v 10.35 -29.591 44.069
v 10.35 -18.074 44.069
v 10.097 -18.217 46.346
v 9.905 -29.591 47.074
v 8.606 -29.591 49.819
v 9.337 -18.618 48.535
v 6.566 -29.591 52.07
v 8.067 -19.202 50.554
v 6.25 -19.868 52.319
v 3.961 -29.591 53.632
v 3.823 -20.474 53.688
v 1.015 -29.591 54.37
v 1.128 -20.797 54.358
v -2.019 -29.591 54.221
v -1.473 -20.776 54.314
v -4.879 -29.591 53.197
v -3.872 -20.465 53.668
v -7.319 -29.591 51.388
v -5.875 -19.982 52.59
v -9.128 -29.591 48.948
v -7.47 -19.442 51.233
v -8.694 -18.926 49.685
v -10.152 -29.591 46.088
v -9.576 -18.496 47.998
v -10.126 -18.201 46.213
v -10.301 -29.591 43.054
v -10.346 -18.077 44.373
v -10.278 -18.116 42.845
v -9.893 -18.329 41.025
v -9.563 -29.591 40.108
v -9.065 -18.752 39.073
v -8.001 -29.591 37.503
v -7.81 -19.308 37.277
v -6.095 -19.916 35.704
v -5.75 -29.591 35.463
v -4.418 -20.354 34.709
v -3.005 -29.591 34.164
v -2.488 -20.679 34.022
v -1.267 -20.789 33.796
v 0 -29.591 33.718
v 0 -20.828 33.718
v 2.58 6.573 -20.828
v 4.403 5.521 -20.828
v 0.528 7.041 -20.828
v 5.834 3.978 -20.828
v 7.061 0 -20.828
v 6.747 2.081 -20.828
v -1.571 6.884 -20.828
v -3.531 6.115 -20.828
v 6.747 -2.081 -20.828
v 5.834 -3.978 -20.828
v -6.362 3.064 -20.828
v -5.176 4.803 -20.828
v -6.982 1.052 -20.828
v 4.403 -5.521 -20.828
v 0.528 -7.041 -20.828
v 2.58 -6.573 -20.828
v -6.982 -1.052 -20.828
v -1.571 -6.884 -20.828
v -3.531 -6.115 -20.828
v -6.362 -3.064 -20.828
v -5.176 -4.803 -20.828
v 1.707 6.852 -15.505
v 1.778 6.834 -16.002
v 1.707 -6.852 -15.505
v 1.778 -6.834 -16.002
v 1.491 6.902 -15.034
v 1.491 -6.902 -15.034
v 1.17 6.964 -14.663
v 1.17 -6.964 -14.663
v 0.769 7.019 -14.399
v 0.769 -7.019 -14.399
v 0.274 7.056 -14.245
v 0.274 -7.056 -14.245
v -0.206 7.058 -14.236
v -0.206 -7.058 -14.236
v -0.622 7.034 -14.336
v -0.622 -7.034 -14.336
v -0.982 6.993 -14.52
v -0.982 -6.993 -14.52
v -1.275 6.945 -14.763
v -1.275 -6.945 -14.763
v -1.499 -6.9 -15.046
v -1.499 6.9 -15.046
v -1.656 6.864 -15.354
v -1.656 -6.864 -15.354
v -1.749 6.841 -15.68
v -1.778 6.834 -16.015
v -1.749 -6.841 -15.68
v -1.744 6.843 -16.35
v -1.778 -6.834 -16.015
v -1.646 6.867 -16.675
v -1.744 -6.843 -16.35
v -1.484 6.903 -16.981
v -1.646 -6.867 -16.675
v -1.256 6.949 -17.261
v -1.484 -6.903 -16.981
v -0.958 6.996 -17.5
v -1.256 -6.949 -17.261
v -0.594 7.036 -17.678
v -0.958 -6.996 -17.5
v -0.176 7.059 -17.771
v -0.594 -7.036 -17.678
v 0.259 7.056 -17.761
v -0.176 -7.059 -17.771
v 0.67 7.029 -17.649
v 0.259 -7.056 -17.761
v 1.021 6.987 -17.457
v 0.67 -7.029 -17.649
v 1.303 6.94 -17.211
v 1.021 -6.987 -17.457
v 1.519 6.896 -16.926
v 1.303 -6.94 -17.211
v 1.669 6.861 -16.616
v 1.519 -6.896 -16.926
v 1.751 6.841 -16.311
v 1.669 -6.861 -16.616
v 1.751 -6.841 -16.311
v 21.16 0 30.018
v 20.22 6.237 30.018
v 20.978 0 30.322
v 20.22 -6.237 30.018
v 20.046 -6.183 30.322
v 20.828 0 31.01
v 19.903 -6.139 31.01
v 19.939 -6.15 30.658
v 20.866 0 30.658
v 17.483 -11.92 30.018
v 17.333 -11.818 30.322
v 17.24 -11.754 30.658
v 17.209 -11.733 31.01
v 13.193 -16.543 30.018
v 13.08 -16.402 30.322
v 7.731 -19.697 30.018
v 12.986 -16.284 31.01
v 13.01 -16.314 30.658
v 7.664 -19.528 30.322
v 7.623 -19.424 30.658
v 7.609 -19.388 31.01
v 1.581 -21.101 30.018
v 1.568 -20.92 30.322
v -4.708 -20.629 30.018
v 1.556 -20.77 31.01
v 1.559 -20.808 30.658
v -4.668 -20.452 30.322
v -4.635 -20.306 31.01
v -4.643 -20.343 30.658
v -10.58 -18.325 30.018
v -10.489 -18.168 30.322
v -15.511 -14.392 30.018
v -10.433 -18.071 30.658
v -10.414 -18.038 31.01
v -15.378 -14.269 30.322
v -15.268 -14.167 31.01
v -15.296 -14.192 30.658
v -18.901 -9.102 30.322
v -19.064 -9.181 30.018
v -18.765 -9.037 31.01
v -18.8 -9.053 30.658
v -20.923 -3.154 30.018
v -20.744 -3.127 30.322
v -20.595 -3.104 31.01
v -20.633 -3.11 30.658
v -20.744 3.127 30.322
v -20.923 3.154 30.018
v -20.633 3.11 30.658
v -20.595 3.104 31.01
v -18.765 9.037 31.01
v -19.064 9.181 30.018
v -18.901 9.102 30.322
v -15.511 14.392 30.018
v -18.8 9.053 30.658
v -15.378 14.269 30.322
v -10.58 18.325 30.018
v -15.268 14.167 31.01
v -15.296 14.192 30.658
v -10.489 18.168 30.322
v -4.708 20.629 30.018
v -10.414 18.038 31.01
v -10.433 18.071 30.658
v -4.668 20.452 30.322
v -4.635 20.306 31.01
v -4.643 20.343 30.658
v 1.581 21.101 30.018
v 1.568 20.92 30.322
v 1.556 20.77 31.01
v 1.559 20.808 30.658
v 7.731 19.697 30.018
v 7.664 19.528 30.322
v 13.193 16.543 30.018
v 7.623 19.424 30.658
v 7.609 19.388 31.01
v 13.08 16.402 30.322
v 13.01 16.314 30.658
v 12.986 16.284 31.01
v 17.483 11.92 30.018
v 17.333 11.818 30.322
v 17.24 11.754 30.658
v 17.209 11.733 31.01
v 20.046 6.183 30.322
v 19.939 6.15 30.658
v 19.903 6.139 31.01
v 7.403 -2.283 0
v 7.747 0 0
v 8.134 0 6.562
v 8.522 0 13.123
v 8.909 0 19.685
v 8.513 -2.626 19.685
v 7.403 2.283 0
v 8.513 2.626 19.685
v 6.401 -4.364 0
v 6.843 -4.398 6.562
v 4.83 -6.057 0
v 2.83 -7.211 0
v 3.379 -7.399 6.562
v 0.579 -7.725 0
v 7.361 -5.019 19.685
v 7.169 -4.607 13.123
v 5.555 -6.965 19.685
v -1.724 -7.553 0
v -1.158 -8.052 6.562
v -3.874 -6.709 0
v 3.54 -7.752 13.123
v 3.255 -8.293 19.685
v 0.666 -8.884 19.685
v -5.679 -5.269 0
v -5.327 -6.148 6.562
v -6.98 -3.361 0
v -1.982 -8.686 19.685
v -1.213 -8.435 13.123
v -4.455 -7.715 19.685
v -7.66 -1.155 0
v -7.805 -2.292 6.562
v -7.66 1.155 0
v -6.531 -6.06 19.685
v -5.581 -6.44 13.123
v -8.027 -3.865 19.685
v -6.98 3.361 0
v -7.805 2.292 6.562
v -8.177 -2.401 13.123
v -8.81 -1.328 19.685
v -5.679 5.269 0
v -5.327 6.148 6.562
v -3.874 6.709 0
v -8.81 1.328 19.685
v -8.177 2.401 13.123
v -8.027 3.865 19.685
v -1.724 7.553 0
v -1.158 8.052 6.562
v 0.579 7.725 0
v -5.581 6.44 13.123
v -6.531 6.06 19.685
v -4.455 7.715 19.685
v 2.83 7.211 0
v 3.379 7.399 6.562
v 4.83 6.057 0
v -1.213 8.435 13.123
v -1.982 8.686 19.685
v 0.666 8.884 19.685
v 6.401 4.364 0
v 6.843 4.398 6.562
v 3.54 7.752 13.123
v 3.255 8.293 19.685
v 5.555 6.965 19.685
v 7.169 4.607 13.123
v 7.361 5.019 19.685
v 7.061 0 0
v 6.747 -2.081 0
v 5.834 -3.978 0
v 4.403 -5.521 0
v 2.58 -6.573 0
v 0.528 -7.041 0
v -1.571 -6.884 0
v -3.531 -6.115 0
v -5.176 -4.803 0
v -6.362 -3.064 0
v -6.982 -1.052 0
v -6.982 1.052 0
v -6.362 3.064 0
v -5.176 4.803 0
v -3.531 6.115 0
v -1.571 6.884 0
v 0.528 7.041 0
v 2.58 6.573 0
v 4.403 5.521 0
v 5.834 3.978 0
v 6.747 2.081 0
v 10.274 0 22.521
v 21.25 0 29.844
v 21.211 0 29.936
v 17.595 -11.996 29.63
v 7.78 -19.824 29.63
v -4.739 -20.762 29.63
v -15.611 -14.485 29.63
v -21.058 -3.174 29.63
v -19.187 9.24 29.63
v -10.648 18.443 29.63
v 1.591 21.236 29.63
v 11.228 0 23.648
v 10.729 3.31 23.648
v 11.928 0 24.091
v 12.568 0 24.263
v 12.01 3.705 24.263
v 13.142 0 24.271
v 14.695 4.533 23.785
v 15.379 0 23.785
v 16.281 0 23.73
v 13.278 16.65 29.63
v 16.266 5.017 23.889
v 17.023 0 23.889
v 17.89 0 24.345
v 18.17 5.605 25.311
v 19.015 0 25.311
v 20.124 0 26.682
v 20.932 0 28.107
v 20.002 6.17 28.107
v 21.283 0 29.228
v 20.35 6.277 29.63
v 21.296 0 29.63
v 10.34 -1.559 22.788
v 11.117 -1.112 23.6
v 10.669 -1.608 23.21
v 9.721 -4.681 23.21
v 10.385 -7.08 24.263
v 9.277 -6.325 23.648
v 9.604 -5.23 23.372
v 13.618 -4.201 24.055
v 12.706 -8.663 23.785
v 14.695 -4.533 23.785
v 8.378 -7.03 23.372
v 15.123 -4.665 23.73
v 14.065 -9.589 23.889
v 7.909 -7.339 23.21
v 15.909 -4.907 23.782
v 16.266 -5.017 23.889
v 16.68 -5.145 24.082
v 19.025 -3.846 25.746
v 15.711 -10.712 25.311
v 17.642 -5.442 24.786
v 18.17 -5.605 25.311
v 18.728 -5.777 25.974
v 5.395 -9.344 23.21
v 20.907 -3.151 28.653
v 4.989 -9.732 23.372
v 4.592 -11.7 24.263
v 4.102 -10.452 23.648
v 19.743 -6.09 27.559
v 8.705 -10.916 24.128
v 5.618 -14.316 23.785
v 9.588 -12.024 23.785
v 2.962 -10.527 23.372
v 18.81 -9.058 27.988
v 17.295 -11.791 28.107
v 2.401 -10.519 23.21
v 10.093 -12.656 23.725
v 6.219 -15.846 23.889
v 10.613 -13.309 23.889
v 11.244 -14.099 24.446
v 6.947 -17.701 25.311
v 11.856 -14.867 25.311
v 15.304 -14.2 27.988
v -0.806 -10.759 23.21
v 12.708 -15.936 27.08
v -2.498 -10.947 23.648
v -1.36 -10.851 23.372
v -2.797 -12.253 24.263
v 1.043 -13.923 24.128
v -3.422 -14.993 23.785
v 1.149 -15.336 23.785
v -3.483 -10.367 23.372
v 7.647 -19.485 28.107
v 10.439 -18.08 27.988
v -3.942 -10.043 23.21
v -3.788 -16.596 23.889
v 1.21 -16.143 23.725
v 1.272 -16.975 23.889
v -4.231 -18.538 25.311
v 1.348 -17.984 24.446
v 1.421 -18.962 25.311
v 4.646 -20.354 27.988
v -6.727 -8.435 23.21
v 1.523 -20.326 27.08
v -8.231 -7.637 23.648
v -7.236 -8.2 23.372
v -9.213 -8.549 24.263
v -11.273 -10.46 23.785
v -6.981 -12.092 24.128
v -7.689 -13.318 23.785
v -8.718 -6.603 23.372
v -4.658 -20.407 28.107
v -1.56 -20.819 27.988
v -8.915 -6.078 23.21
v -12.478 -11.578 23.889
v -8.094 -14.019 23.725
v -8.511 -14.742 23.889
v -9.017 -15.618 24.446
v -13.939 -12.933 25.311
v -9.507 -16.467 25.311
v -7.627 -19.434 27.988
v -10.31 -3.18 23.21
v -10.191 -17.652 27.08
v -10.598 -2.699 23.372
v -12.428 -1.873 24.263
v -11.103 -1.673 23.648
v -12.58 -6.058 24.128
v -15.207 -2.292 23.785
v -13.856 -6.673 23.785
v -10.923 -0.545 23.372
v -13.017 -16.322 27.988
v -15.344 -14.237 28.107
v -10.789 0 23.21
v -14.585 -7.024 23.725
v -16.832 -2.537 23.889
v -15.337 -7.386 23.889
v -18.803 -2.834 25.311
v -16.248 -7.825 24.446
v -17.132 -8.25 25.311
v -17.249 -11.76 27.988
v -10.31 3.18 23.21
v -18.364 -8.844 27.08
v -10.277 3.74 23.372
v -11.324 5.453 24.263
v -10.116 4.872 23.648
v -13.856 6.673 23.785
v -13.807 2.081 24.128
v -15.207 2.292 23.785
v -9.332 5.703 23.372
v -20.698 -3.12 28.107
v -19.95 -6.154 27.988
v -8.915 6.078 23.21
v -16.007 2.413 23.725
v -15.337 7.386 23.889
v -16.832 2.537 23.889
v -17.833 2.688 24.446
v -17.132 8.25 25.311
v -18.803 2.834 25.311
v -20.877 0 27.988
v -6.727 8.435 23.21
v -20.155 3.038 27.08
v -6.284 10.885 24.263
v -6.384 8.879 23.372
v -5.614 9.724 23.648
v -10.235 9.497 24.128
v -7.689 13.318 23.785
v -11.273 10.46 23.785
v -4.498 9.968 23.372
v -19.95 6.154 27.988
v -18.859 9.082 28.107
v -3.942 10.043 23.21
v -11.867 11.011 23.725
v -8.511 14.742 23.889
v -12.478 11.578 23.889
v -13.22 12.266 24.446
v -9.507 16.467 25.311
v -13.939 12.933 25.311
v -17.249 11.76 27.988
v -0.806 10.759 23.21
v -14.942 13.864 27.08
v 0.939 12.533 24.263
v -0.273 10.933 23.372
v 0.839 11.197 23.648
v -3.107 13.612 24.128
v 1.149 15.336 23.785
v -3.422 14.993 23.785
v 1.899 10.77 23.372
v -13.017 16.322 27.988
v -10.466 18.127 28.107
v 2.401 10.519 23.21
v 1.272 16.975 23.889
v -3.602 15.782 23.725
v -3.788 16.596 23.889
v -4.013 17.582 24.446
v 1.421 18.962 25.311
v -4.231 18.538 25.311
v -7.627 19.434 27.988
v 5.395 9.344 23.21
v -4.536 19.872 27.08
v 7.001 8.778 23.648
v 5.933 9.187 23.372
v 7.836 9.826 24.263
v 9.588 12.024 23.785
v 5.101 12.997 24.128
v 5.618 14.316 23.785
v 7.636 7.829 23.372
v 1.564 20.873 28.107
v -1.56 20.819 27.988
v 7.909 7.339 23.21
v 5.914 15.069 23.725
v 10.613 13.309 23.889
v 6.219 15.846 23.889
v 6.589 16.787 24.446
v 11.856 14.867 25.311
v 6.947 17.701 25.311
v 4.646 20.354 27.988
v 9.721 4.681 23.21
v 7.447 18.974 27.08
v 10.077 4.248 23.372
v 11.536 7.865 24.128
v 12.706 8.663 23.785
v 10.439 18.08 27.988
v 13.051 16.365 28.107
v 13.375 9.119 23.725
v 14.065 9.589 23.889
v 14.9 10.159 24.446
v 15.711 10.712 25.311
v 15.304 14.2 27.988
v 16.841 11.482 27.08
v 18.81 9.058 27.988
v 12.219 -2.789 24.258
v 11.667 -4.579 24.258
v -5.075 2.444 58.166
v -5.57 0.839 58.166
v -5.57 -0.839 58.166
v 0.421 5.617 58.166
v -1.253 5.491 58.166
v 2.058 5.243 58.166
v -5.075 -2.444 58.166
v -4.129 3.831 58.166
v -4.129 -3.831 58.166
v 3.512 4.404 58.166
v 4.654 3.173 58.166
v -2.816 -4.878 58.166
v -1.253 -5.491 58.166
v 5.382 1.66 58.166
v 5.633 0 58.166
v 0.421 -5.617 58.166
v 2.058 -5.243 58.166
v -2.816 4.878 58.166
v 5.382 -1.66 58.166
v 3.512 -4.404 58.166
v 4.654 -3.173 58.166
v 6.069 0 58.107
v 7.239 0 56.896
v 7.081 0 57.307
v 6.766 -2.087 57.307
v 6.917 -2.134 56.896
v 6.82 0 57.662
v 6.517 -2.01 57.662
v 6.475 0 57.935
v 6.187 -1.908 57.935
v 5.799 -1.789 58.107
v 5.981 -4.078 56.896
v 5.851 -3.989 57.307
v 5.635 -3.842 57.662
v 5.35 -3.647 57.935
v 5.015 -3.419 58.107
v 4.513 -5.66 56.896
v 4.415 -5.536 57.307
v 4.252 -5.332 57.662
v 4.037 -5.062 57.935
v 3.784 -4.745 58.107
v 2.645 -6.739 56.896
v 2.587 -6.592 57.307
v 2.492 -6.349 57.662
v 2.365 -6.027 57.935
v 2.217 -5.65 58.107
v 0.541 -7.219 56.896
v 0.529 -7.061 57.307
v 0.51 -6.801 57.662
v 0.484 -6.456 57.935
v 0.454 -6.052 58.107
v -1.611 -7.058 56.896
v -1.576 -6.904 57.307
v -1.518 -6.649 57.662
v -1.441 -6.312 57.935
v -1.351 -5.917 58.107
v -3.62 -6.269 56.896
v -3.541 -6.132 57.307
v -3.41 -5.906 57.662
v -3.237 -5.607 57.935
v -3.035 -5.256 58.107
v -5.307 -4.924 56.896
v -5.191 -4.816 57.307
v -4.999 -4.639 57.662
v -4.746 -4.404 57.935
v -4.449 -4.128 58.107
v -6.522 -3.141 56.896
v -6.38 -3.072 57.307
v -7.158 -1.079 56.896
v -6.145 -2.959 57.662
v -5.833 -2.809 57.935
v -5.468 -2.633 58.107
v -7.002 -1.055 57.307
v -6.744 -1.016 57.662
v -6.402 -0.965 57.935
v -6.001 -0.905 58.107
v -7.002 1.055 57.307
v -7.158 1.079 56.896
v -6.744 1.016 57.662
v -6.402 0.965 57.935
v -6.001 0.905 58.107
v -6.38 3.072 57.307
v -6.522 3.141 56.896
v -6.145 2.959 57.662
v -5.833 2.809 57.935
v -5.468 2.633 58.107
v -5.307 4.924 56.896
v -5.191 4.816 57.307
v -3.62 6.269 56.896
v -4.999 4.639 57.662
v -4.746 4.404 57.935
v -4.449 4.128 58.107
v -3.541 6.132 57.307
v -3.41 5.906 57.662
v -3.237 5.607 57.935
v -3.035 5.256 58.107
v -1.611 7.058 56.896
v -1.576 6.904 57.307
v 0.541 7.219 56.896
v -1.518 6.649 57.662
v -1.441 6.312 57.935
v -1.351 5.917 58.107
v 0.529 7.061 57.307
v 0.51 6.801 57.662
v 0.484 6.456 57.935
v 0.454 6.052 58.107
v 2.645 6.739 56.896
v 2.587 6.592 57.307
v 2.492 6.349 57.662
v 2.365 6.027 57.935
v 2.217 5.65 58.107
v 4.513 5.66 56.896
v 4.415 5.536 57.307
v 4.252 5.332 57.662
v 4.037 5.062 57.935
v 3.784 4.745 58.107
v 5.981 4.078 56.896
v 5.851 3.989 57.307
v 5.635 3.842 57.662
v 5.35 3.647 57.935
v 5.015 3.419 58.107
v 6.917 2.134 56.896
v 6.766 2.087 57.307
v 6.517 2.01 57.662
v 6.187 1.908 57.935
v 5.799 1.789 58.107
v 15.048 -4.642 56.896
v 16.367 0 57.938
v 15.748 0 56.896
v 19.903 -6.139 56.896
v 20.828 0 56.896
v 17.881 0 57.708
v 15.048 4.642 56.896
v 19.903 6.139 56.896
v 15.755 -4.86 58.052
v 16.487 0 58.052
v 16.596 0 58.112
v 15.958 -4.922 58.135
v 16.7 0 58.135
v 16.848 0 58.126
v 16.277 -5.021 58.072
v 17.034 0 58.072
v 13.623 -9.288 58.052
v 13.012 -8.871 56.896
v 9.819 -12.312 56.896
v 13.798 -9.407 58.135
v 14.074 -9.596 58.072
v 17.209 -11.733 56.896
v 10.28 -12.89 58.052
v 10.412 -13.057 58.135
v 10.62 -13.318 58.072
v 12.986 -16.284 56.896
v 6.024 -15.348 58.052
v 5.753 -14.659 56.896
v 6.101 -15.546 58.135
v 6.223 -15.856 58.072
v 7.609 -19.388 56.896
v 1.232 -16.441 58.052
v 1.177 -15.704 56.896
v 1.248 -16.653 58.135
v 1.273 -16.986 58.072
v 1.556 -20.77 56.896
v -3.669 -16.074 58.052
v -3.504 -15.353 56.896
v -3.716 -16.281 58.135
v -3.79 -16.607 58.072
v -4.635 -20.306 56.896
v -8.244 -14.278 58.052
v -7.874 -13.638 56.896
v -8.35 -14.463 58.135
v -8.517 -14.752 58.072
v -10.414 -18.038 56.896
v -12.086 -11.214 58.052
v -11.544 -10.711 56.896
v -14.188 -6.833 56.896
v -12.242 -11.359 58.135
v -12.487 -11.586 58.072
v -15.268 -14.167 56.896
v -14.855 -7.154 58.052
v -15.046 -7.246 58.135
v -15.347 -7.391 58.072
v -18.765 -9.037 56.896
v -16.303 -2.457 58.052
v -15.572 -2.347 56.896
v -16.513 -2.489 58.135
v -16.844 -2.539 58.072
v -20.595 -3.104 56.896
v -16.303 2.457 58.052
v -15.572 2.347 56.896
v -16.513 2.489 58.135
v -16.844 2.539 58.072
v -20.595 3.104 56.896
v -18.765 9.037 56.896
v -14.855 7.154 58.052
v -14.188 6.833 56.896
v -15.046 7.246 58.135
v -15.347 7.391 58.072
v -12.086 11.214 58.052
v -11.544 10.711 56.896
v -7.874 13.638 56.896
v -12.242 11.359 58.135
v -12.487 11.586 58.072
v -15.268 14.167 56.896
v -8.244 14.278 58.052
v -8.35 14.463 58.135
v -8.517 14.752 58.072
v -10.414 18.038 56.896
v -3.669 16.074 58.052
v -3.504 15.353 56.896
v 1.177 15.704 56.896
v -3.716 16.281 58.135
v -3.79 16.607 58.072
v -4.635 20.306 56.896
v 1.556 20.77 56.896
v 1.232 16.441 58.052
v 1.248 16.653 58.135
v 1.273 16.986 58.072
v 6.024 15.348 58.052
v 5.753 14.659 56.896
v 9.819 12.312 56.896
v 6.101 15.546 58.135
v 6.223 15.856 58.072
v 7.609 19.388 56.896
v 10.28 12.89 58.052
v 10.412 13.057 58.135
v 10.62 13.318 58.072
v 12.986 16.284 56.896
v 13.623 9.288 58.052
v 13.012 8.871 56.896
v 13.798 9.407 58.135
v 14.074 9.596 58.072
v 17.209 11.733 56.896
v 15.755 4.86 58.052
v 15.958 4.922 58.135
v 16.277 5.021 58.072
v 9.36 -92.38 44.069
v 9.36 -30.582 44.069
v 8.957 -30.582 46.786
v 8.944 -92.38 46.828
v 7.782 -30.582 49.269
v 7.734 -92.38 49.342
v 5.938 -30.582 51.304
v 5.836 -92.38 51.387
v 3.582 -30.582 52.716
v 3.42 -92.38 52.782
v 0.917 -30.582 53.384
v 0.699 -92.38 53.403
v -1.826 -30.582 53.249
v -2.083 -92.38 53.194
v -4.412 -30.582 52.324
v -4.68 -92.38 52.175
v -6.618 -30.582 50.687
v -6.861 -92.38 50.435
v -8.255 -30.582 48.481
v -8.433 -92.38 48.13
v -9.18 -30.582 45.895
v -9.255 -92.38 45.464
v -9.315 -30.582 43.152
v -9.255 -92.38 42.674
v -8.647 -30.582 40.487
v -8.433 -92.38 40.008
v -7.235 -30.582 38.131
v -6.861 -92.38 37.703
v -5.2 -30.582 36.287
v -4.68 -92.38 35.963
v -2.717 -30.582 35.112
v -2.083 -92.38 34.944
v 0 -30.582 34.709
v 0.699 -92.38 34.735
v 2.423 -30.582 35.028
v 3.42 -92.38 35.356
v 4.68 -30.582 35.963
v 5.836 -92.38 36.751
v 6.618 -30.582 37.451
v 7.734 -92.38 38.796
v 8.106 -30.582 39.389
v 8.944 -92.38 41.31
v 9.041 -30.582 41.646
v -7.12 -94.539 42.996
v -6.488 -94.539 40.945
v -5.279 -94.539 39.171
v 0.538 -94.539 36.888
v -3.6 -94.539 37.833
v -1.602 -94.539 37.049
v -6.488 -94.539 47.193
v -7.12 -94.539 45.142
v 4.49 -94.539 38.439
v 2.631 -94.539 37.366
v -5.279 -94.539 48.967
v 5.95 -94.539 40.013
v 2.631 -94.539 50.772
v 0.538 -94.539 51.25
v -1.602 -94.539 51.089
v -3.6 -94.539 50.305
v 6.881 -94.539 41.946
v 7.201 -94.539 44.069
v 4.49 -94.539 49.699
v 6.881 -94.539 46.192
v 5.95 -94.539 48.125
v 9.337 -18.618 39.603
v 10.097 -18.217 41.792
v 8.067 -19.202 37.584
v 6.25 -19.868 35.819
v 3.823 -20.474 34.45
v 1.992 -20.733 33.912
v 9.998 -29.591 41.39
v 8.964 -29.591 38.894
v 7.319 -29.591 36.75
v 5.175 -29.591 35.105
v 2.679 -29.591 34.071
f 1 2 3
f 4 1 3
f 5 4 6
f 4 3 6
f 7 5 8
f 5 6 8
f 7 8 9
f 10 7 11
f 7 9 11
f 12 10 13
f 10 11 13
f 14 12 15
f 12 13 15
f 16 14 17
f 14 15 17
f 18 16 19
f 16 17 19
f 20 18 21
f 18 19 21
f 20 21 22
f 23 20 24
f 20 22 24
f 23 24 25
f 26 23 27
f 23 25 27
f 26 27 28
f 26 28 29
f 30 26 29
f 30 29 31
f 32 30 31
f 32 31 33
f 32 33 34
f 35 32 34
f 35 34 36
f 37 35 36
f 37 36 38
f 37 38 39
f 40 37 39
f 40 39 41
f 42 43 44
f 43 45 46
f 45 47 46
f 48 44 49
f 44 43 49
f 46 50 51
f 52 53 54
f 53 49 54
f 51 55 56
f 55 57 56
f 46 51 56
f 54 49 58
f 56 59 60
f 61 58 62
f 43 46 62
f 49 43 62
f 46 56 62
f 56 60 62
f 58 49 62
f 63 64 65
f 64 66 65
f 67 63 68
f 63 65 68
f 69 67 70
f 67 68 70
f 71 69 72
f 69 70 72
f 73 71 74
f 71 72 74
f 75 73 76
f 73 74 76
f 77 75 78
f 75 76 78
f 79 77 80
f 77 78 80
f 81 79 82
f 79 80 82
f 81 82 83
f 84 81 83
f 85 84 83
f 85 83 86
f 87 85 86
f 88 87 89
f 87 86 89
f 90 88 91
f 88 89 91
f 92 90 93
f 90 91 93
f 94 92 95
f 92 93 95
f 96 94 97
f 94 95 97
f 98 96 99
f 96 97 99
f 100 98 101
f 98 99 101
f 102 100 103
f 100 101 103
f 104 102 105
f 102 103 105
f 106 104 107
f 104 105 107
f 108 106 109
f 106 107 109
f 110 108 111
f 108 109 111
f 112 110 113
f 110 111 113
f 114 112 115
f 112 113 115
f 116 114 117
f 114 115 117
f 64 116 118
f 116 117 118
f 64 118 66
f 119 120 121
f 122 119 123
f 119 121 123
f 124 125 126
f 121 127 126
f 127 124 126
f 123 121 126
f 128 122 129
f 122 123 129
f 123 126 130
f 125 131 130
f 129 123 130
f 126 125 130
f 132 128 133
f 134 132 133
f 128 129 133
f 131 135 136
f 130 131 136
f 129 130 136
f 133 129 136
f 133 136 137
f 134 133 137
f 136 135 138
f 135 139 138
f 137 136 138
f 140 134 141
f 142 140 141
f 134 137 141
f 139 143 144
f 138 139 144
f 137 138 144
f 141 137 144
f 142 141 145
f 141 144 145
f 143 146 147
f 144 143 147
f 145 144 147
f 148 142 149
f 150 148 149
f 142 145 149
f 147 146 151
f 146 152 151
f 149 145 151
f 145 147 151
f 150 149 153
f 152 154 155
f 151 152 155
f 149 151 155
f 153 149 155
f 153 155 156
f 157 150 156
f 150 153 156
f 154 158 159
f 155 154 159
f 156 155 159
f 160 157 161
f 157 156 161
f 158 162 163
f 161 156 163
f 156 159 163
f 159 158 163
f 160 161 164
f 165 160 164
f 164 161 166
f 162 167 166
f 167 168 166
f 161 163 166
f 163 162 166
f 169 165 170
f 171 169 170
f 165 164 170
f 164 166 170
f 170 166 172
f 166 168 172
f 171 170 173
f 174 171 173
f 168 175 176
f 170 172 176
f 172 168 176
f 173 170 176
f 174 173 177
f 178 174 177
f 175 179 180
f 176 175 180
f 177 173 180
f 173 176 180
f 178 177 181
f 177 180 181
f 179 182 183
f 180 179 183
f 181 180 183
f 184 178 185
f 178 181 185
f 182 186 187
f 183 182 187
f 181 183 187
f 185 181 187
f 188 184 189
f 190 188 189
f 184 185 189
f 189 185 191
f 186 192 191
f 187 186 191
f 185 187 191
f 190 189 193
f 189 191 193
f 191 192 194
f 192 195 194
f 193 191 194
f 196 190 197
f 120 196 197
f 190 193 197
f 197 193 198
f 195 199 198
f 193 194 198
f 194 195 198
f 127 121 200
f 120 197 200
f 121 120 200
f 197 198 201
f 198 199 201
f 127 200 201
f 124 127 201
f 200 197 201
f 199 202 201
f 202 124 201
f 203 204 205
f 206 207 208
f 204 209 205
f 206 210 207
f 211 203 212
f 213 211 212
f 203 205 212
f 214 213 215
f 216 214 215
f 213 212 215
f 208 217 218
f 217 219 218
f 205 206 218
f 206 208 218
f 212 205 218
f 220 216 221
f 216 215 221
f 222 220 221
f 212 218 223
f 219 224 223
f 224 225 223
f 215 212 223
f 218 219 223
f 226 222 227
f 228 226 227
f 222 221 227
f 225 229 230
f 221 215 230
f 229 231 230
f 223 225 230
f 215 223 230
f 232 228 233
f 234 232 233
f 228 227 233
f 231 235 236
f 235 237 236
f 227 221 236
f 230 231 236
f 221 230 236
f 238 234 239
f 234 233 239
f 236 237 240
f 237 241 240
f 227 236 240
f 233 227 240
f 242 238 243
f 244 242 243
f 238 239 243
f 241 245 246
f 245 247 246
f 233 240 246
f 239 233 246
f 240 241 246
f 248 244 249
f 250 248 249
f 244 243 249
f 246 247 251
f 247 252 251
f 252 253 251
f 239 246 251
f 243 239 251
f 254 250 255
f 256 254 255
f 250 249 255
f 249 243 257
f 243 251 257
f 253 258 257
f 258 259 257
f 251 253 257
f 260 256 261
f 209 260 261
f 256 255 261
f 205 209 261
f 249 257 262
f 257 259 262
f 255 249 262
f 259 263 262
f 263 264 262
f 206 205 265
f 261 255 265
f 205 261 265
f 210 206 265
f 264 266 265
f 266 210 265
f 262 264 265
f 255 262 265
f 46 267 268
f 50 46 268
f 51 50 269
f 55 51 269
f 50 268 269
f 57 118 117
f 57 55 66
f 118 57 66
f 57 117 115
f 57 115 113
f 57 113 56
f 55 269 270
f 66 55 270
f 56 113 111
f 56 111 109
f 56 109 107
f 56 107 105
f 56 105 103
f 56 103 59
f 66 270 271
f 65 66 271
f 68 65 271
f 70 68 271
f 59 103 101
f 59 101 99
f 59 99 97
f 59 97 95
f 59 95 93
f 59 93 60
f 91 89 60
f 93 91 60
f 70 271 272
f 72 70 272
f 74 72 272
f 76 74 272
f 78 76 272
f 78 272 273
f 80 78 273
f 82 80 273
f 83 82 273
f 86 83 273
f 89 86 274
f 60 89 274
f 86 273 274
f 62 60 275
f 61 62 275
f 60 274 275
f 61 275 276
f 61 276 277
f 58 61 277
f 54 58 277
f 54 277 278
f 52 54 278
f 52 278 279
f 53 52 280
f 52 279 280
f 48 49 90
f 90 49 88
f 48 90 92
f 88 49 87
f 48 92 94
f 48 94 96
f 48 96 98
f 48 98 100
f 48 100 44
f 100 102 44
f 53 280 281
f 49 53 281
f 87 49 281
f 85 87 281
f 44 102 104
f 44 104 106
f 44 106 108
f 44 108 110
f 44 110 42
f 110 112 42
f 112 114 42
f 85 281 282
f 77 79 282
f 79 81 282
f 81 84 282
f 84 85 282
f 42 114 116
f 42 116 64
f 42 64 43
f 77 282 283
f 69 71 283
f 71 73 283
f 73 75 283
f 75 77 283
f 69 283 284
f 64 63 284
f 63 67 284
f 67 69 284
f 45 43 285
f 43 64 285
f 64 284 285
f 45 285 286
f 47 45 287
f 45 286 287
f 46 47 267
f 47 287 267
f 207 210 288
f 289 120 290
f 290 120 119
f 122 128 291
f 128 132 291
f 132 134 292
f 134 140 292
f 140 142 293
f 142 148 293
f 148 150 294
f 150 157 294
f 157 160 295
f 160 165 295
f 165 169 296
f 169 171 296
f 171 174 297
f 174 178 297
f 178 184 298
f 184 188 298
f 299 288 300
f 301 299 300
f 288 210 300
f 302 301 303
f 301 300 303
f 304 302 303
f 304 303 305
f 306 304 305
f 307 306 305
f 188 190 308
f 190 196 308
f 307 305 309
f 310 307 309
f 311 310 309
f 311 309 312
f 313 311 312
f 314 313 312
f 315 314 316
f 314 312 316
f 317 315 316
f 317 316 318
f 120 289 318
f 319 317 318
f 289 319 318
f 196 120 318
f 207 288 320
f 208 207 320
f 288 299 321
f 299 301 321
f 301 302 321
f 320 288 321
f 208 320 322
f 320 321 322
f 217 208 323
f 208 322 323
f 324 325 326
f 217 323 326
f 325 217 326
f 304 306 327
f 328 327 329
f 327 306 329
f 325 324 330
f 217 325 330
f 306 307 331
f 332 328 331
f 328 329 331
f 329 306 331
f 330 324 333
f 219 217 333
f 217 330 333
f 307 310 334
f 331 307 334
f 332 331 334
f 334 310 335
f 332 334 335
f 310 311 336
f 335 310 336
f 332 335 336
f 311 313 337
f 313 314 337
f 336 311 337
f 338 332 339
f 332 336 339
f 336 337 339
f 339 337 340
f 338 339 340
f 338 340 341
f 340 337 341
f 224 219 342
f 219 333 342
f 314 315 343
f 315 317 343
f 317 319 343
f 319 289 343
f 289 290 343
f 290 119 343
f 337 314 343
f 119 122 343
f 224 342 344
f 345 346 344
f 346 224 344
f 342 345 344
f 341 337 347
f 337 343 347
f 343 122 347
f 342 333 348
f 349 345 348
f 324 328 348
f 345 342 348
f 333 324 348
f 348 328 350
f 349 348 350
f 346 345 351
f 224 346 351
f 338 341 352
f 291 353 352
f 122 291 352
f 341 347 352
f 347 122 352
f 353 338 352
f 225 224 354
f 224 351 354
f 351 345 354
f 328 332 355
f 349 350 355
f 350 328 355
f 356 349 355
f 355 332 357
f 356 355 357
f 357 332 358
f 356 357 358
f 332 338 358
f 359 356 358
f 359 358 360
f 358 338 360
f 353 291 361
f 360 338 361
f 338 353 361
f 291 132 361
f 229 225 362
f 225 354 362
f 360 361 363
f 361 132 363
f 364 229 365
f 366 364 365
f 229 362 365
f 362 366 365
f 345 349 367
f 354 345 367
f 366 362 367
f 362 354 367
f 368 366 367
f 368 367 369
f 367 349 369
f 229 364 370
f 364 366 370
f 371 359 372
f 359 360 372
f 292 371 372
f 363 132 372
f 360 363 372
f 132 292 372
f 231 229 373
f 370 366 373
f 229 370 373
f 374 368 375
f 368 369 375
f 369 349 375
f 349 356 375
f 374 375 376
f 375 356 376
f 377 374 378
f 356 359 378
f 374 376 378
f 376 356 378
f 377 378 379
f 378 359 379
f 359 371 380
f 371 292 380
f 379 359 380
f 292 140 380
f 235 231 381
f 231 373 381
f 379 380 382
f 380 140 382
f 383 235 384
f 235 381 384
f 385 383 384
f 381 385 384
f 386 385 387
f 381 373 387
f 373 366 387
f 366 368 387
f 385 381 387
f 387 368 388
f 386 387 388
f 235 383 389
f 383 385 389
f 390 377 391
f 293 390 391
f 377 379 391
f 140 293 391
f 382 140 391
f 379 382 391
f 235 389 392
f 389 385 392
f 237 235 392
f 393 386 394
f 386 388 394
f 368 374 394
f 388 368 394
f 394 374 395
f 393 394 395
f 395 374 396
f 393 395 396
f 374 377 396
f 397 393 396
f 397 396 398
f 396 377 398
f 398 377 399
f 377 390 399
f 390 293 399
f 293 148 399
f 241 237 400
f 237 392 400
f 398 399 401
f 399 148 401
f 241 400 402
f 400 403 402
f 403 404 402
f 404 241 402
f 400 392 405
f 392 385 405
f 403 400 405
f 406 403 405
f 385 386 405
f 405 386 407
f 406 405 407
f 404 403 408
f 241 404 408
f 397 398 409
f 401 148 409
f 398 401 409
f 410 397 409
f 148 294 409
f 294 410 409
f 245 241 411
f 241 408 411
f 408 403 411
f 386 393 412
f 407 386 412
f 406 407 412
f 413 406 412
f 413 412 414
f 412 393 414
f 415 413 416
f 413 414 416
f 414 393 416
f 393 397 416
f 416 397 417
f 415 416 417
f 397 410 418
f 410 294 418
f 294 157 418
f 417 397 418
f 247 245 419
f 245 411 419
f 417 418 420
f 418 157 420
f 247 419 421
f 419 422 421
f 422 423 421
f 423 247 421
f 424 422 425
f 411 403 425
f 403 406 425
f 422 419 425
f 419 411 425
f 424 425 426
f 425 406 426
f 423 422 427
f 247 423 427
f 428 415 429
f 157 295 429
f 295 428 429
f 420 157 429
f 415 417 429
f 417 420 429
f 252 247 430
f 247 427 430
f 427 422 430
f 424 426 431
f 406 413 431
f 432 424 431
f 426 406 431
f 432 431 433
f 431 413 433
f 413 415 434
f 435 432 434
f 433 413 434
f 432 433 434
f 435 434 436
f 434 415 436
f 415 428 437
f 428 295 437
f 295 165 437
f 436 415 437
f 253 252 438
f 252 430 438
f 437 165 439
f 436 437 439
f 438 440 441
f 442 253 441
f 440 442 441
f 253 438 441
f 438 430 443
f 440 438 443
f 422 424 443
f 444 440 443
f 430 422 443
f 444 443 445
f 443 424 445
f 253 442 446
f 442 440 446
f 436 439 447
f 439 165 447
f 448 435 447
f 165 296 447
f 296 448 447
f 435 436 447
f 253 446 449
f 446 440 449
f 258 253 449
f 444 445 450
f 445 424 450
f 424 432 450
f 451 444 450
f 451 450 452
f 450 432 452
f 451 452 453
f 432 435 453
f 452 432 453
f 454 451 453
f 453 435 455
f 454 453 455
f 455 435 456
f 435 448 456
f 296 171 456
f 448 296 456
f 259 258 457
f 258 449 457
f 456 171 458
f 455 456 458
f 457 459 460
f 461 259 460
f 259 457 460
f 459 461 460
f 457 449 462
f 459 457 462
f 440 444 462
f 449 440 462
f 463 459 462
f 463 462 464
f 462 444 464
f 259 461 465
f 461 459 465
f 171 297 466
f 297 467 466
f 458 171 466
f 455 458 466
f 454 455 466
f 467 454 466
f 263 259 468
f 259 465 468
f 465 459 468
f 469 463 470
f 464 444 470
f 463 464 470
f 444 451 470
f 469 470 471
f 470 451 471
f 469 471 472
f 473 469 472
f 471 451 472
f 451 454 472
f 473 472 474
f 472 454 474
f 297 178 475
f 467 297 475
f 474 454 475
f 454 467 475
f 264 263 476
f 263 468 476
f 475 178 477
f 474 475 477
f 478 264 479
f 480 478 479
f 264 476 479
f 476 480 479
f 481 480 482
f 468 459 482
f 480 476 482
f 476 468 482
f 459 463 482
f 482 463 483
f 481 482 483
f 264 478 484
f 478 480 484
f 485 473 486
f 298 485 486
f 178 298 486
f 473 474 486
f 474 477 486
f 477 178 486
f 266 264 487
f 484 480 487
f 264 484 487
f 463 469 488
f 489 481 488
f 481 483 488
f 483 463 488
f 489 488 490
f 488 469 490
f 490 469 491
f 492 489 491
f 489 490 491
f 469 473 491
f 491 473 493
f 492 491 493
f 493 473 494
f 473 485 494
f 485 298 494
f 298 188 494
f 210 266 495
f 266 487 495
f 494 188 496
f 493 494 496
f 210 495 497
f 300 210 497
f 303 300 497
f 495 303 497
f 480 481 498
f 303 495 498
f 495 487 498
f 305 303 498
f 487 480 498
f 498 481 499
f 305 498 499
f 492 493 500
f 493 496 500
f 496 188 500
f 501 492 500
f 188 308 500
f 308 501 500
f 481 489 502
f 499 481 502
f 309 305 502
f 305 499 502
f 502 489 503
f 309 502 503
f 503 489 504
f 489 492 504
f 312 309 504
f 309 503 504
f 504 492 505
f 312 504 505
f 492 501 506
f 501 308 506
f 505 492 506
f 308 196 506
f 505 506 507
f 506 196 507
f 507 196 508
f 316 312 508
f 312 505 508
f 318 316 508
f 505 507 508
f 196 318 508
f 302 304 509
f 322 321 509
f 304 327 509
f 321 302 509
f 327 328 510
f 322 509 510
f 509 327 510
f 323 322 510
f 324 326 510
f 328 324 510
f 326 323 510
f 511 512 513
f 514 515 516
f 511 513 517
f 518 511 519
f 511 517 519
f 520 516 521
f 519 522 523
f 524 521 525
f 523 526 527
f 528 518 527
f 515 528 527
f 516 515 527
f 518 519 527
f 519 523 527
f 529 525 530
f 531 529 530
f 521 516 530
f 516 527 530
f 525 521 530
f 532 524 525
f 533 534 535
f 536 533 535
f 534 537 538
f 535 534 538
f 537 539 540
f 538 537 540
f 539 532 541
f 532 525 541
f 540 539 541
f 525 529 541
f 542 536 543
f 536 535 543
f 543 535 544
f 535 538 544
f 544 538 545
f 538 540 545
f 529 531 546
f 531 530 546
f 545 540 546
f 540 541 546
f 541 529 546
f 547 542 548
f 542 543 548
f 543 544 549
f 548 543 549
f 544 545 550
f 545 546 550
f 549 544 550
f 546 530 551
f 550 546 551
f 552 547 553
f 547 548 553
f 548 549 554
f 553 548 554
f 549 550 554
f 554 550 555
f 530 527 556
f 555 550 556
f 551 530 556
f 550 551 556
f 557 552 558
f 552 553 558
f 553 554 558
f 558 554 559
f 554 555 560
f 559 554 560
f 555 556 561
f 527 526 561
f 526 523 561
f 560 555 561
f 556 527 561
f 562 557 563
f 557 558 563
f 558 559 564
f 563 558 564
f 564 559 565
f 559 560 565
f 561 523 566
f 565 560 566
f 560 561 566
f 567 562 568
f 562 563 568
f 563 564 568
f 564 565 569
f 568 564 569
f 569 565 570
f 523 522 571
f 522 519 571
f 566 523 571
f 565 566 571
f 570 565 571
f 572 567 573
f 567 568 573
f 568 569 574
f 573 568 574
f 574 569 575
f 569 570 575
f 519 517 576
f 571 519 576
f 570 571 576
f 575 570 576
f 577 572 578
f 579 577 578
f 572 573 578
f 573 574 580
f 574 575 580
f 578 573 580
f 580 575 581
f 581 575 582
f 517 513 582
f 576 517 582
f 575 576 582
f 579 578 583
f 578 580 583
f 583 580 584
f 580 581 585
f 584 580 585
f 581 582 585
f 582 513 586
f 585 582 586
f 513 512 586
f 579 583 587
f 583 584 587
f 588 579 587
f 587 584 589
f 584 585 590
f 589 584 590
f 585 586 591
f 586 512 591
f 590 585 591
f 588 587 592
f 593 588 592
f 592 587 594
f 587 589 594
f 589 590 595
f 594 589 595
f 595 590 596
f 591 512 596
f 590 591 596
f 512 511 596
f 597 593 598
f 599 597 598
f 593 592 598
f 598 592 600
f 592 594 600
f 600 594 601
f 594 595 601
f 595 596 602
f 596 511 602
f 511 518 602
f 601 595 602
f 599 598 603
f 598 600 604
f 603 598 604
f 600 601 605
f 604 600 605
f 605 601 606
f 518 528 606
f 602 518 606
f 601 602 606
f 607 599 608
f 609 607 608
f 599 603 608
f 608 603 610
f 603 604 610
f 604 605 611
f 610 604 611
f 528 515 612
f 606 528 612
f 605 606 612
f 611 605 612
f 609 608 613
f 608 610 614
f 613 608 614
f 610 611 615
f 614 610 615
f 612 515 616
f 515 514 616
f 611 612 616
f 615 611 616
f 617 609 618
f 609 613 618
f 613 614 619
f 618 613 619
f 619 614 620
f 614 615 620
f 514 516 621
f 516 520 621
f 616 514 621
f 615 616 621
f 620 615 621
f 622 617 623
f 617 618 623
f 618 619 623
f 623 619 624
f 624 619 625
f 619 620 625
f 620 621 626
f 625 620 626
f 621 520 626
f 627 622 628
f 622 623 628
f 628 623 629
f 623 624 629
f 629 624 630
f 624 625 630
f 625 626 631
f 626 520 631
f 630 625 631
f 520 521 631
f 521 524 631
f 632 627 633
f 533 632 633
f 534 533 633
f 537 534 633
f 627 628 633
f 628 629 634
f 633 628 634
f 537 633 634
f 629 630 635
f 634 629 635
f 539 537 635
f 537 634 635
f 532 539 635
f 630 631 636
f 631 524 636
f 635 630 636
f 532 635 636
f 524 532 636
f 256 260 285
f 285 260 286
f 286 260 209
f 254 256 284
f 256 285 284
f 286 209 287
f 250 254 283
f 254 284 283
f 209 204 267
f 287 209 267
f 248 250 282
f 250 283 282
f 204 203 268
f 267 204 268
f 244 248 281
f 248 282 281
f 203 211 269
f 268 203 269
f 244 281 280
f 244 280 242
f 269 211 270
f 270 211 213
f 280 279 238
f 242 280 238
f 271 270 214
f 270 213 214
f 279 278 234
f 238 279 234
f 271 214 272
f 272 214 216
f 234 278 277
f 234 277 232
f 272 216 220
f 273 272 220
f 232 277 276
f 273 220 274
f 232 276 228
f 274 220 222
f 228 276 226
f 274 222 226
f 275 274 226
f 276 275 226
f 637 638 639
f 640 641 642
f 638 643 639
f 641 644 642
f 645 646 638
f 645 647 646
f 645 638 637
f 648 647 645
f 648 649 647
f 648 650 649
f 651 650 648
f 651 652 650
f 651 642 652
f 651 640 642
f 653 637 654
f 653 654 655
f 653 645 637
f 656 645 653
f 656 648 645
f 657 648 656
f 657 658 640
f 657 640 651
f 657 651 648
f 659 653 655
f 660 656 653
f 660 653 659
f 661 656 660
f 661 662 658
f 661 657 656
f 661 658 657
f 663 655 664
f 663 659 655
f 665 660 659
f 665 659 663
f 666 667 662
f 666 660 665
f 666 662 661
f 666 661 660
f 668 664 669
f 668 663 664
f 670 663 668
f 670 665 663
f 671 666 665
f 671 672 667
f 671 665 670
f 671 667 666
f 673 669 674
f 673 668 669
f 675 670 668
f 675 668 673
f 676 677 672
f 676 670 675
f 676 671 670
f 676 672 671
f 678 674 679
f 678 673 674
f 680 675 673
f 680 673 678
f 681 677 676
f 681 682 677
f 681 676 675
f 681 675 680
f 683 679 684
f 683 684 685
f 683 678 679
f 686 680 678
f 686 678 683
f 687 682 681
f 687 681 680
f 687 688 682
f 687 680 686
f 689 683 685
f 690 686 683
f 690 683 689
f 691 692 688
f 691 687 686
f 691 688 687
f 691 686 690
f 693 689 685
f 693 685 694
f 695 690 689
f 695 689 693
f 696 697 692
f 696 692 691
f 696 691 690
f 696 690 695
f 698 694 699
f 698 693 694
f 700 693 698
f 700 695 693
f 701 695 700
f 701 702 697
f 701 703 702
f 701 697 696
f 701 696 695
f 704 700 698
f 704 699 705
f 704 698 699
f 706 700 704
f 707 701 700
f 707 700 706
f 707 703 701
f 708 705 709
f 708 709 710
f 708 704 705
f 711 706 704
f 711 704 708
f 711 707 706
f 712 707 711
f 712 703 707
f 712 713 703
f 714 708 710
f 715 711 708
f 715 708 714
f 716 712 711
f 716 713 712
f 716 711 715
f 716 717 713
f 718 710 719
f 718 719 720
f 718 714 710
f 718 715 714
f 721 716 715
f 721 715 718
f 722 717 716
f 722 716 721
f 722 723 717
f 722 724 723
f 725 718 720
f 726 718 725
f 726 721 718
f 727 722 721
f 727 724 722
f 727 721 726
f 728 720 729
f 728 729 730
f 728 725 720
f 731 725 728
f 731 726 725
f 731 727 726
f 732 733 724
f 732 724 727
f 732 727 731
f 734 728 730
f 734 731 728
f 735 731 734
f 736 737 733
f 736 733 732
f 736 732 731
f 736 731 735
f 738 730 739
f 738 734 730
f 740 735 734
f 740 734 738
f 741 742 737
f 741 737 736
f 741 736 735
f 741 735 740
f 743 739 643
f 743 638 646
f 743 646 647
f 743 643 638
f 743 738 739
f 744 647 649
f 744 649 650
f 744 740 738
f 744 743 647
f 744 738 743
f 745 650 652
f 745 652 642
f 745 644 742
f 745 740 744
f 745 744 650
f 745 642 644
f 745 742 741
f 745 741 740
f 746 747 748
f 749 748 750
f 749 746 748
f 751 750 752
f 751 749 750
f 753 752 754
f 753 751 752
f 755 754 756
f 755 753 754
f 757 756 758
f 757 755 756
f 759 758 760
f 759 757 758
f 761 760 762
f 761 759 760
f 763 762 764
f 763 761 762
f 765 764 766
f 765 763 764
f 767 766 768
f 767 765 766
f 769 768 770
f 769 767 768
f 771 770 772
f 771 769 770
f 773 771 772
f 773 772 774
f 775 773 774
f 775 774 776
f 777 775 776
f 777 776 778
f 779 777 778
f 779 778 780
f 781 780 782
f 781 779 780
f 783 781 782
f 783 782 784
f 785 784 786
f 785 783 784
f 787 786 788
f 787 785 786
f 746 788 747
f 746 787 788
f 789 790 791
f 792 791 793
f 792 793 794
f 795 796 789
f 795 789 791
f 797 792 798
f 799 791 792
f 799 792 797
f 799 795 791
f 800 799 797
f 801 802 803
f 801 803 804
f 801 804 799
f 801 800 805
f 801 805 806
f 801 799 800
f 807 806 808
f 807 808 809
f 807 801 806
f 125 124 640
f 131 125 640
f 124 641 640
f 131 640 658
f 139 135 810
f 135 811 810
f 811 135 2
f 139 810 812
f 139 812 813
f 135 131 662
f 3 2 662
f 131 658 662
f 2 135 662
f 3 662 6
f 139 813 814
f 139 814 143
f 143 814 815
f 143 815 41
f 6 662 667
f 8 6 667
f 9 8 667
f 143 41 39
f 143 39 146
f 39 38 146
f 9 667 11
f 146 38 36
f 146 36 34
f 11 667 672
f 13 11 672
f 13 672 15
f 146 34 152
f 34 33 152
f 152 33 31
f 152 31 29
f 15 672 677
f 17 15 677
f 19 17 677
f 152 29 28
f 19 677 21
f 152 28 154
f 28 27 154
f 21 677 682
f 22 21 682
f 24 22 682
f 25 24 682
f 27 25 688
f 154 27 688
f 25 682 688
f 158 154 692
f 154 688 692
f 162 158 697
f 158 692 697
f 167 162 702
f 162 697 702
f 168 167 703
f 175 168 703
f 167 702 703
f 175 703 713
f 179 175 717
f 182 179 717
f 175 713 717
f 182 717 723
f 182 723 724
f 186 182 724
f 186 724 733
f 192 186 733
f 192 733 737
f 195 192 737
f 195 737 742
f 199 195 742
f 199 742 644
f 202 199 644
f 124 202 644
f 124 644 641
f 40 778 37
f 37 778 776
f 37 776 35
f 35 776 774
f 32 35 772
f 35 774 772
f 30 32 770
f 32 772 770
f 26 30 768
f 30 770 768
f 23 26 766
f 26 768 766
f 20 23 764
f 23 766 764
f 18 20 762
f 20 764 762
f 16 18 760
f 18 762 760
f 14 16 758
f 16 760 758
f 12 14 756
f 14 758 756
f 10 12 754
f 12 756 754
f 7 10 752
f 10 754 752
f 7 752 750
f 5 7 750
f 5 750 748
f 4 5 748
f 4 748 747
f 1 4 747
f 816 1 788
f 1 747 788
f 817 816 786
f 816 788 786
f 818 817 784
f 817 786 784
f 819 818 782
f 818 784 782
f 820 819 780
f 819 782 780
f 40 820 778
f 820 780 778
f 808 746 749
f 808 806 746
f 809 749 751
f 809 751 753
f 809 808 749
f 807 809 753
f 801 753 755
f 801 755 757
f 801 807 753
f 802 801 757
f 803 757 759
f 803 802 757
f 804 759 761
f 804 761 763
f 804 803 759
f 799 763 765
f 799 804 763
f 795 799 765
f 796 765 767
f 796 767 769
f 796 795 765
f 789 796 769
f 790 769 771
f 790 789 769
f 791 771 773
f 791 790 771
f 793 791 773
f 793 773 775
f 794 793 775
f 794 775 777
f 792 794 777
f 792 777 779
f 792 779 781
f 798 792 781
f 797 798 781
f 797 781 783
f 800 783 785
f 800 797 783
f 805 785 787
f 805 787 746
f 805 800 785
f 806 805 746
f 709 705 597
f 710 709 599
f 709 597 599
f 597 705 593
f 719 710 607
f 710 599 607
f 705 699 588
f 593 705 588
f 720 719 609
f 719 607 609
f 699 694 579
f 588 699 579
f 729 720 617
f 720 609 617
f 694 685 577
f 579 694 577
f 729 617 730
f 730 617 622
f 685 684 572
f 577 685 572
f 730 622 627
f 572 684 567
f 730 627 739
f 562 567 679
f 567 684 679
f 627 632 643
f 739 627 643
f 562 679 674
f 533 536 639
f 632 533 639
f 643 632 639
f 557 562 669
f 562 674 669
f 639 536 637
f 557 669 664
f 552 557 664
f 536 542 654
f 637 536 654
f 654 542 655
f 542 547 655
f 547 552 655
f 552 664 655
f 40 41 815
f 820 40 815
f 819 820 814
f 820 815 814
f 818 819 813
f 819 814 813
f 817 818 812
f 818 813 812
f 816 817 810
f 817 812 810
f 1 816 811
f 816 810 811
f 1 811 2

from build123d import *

# Parameters (mm, degrees)
F2_R        = 1.778
F3_DEPTH    = 12.7
F5_DEPTH    = 31.75
F6_R        = 9.3599
F7_DEPTH    = 62.7888
F8_S5_R     = 9.3599
F8_T6_DEPTH = 16


# Not quite as in the source:
# - a fillet or chamfer that OpenCascade refuses, or shapes differently, is made with other operations: its cross-section is extruded or revolved along the edge and cut away or added


with BuildPart() as f1:
    # F0 (on Front) → F1 (revolve)
    with BuildSketch(Plane.XZ):
        with BuildLine():
            Line((6.35, 58.166), (0, 58.166))
            Line((0, 58.166), (0, 30.226))
            Line((0, 30.226), (0, 19.685))
            Line((0, 19.685), (0, 0))
            Line((0, 0), (0, -20.828))
            Line((0, -20.828), (7.0612, -20.828))
            Line((7.0612, -20.828), (7.0612, 0))
            Line((7.0612, 0), (7.747, 0))
            Line((7.747, 0), (8.90905, 19.685))
            add(Edge.make_bspline(
                [(8.90905, 19.685), (11.7912068963, 27.2870212793), (16.1954839903, 19.0053529362), (22.480616346, 29.8321191221), (20.828, 30.226)],
                knots=[0, 0, 0, 0, 0.5235722787, 1, 1, 1, 1], degree=3))
            Line((20.828, 30.226), (20.828, 56.896))
            add(Edge.make_bspline(
                [(15.748, 56.896), (16.993034631, 59.2658407986), (16.2821896374, 57.6469525695), (20.828, 56.896)],
                knots=[0, 0, 0, 0, 5.08, 5.08, 5.08, 5.08], degree=3))
            Line((15.748, 56.896), (7.239, 56.896))
            Line((7.239, 56.896), (7.239, 58.166))
            Line((7.239, 58.166), (6.35, 58.166))
        make_face()
    revolve(axis=Axis((0, 0, -8.4981196864), (0, 0, -1)))

    # F2 (on Front) → F3 (cut, symmetric)
    with BuildSketch(Plane.XZ):
        with Locations((0, -16.002)):
            Circle(F2_R)
    extrude(amount=F3_DEPTH, both=True, mode=Mode.SUBTRACT)

    # F4 (on Front) → F5 (join)
    with BuildSketch(Plane.XZ):
        with BuildLine():
            ThreePointArc((0, 33.7185), (7.3189087387, 36.7500912613), (10.3505, 44.069))
            ThreePointArc((10.3505, 44.069), (-7.3189087387, 51.3879087387), (0, 33.7185))
        make_face()
    extrude(amount=F5_DEPTH)

    # F6 (on face) → F7 (join)
    with BuildSketch(Plane.XZ.offset(31.75)):
        with Locations((0, 44.069)):
            Circle(F6_R)
    extrude(amount=F7_DEPTH)

    # F8: chamfer of 2.159 on 2 edges, made by hand


with BuildPart() as f8_tool2:
    # F8_s3 → F8_t4 (revolve)
    with BuildSketch(Plane.YZ):
        Polygon((-29.591, 33.7185), (-31.75, 35.8775), (-31.75, 33.7185), align=None)
    revolve(axis=Axis((0, -31.75, 44.069), (0, 1, 0)))

    # F8_s5 → F8_t6 (cut, symmetric)
    with BuildSketch(Plane.XZ.offset(30.7)):
        with Locations((0, 44.069)):
            Circle(F8_S5_R)
    extrude(amount=F8_T6_DEPTH, both=True, mode=Mode.SUBTRACT)


with BuildPart() as f1_1:
    add(f1.part)

    # F8_t1: cut F8_tool2
    add(f8_tool2.part, mode=Mode.SUBTRACT)

    # F8_s7 → F8_t8 (revolve, cut)
    with BuildSketch(Plane.XY.offset(44.069)):
        Polygon((9.3599, -92.3798), (7.2009, -94.5388), (9.3599, -94.5388), align=None)
    revolve(axis=Axis((0, -94.5388, 44.069), (0, -1, 0)), mode=Mode.SUBTRACT)

    # F9: fillet of radius 1.651 on 2 edges, made by hand

    # F9_s1 → F9_t2 (revolve, cut)
    with BuildSketch(Plane.XZ):
        with BuildLine():
            ThreePointArc((7.239, 56.896), (6.6564696827, 57.8101509565), (5.6325629486, 58.166))
            Line((5.6325629486, 58.166), (5.6325629486, 58.19902))
            Line((5.6325629486, 58.19902), (7.239, 58.19902))
            Line((7.239, 58.19902), (7.27202, 58.166))
            ThreePointArc((7.27202, 58.166), (7.27202, 57.531), (7.271128741, 56.90362))
            Line((7.271128741, 56.90362), (7.239, 56.896))
        make_face()
    revolve(axis=Axis((0, 0, 58.166), (0, 0, -1)), mode=Mode.SUBTRACT)

    # F9_s3 → F9_t4 (revolve)
    with BuildSketch(Plane.XZ):
        with BuildLine():
            ThreePointArc((21.1597456512, 30.0175911775), (20.9131312427, 30.4869361434), (20.828, 31.010248703))
            Line((20.828, 31.010248703), (20.79498, 31.010248703))
            Line((20.79498, 31.010248703), (20.79498, 30.226))
            Line((20.79498, 30.226), (20.8203445184, 30.1938796949))
            ThreePointArc((20.8203445184, 30.1938796949), (20.9949538129, 30.1235602191), (21.1333605642, 29.997738027))
            Line((21.1333605642, 29.997738027), (21.1597456512, 30.0175911775))
        make_face()
    revolve(axis=Axis((0, 0, 30.226), (0, 0, -1)))


solid = f1_1.part
